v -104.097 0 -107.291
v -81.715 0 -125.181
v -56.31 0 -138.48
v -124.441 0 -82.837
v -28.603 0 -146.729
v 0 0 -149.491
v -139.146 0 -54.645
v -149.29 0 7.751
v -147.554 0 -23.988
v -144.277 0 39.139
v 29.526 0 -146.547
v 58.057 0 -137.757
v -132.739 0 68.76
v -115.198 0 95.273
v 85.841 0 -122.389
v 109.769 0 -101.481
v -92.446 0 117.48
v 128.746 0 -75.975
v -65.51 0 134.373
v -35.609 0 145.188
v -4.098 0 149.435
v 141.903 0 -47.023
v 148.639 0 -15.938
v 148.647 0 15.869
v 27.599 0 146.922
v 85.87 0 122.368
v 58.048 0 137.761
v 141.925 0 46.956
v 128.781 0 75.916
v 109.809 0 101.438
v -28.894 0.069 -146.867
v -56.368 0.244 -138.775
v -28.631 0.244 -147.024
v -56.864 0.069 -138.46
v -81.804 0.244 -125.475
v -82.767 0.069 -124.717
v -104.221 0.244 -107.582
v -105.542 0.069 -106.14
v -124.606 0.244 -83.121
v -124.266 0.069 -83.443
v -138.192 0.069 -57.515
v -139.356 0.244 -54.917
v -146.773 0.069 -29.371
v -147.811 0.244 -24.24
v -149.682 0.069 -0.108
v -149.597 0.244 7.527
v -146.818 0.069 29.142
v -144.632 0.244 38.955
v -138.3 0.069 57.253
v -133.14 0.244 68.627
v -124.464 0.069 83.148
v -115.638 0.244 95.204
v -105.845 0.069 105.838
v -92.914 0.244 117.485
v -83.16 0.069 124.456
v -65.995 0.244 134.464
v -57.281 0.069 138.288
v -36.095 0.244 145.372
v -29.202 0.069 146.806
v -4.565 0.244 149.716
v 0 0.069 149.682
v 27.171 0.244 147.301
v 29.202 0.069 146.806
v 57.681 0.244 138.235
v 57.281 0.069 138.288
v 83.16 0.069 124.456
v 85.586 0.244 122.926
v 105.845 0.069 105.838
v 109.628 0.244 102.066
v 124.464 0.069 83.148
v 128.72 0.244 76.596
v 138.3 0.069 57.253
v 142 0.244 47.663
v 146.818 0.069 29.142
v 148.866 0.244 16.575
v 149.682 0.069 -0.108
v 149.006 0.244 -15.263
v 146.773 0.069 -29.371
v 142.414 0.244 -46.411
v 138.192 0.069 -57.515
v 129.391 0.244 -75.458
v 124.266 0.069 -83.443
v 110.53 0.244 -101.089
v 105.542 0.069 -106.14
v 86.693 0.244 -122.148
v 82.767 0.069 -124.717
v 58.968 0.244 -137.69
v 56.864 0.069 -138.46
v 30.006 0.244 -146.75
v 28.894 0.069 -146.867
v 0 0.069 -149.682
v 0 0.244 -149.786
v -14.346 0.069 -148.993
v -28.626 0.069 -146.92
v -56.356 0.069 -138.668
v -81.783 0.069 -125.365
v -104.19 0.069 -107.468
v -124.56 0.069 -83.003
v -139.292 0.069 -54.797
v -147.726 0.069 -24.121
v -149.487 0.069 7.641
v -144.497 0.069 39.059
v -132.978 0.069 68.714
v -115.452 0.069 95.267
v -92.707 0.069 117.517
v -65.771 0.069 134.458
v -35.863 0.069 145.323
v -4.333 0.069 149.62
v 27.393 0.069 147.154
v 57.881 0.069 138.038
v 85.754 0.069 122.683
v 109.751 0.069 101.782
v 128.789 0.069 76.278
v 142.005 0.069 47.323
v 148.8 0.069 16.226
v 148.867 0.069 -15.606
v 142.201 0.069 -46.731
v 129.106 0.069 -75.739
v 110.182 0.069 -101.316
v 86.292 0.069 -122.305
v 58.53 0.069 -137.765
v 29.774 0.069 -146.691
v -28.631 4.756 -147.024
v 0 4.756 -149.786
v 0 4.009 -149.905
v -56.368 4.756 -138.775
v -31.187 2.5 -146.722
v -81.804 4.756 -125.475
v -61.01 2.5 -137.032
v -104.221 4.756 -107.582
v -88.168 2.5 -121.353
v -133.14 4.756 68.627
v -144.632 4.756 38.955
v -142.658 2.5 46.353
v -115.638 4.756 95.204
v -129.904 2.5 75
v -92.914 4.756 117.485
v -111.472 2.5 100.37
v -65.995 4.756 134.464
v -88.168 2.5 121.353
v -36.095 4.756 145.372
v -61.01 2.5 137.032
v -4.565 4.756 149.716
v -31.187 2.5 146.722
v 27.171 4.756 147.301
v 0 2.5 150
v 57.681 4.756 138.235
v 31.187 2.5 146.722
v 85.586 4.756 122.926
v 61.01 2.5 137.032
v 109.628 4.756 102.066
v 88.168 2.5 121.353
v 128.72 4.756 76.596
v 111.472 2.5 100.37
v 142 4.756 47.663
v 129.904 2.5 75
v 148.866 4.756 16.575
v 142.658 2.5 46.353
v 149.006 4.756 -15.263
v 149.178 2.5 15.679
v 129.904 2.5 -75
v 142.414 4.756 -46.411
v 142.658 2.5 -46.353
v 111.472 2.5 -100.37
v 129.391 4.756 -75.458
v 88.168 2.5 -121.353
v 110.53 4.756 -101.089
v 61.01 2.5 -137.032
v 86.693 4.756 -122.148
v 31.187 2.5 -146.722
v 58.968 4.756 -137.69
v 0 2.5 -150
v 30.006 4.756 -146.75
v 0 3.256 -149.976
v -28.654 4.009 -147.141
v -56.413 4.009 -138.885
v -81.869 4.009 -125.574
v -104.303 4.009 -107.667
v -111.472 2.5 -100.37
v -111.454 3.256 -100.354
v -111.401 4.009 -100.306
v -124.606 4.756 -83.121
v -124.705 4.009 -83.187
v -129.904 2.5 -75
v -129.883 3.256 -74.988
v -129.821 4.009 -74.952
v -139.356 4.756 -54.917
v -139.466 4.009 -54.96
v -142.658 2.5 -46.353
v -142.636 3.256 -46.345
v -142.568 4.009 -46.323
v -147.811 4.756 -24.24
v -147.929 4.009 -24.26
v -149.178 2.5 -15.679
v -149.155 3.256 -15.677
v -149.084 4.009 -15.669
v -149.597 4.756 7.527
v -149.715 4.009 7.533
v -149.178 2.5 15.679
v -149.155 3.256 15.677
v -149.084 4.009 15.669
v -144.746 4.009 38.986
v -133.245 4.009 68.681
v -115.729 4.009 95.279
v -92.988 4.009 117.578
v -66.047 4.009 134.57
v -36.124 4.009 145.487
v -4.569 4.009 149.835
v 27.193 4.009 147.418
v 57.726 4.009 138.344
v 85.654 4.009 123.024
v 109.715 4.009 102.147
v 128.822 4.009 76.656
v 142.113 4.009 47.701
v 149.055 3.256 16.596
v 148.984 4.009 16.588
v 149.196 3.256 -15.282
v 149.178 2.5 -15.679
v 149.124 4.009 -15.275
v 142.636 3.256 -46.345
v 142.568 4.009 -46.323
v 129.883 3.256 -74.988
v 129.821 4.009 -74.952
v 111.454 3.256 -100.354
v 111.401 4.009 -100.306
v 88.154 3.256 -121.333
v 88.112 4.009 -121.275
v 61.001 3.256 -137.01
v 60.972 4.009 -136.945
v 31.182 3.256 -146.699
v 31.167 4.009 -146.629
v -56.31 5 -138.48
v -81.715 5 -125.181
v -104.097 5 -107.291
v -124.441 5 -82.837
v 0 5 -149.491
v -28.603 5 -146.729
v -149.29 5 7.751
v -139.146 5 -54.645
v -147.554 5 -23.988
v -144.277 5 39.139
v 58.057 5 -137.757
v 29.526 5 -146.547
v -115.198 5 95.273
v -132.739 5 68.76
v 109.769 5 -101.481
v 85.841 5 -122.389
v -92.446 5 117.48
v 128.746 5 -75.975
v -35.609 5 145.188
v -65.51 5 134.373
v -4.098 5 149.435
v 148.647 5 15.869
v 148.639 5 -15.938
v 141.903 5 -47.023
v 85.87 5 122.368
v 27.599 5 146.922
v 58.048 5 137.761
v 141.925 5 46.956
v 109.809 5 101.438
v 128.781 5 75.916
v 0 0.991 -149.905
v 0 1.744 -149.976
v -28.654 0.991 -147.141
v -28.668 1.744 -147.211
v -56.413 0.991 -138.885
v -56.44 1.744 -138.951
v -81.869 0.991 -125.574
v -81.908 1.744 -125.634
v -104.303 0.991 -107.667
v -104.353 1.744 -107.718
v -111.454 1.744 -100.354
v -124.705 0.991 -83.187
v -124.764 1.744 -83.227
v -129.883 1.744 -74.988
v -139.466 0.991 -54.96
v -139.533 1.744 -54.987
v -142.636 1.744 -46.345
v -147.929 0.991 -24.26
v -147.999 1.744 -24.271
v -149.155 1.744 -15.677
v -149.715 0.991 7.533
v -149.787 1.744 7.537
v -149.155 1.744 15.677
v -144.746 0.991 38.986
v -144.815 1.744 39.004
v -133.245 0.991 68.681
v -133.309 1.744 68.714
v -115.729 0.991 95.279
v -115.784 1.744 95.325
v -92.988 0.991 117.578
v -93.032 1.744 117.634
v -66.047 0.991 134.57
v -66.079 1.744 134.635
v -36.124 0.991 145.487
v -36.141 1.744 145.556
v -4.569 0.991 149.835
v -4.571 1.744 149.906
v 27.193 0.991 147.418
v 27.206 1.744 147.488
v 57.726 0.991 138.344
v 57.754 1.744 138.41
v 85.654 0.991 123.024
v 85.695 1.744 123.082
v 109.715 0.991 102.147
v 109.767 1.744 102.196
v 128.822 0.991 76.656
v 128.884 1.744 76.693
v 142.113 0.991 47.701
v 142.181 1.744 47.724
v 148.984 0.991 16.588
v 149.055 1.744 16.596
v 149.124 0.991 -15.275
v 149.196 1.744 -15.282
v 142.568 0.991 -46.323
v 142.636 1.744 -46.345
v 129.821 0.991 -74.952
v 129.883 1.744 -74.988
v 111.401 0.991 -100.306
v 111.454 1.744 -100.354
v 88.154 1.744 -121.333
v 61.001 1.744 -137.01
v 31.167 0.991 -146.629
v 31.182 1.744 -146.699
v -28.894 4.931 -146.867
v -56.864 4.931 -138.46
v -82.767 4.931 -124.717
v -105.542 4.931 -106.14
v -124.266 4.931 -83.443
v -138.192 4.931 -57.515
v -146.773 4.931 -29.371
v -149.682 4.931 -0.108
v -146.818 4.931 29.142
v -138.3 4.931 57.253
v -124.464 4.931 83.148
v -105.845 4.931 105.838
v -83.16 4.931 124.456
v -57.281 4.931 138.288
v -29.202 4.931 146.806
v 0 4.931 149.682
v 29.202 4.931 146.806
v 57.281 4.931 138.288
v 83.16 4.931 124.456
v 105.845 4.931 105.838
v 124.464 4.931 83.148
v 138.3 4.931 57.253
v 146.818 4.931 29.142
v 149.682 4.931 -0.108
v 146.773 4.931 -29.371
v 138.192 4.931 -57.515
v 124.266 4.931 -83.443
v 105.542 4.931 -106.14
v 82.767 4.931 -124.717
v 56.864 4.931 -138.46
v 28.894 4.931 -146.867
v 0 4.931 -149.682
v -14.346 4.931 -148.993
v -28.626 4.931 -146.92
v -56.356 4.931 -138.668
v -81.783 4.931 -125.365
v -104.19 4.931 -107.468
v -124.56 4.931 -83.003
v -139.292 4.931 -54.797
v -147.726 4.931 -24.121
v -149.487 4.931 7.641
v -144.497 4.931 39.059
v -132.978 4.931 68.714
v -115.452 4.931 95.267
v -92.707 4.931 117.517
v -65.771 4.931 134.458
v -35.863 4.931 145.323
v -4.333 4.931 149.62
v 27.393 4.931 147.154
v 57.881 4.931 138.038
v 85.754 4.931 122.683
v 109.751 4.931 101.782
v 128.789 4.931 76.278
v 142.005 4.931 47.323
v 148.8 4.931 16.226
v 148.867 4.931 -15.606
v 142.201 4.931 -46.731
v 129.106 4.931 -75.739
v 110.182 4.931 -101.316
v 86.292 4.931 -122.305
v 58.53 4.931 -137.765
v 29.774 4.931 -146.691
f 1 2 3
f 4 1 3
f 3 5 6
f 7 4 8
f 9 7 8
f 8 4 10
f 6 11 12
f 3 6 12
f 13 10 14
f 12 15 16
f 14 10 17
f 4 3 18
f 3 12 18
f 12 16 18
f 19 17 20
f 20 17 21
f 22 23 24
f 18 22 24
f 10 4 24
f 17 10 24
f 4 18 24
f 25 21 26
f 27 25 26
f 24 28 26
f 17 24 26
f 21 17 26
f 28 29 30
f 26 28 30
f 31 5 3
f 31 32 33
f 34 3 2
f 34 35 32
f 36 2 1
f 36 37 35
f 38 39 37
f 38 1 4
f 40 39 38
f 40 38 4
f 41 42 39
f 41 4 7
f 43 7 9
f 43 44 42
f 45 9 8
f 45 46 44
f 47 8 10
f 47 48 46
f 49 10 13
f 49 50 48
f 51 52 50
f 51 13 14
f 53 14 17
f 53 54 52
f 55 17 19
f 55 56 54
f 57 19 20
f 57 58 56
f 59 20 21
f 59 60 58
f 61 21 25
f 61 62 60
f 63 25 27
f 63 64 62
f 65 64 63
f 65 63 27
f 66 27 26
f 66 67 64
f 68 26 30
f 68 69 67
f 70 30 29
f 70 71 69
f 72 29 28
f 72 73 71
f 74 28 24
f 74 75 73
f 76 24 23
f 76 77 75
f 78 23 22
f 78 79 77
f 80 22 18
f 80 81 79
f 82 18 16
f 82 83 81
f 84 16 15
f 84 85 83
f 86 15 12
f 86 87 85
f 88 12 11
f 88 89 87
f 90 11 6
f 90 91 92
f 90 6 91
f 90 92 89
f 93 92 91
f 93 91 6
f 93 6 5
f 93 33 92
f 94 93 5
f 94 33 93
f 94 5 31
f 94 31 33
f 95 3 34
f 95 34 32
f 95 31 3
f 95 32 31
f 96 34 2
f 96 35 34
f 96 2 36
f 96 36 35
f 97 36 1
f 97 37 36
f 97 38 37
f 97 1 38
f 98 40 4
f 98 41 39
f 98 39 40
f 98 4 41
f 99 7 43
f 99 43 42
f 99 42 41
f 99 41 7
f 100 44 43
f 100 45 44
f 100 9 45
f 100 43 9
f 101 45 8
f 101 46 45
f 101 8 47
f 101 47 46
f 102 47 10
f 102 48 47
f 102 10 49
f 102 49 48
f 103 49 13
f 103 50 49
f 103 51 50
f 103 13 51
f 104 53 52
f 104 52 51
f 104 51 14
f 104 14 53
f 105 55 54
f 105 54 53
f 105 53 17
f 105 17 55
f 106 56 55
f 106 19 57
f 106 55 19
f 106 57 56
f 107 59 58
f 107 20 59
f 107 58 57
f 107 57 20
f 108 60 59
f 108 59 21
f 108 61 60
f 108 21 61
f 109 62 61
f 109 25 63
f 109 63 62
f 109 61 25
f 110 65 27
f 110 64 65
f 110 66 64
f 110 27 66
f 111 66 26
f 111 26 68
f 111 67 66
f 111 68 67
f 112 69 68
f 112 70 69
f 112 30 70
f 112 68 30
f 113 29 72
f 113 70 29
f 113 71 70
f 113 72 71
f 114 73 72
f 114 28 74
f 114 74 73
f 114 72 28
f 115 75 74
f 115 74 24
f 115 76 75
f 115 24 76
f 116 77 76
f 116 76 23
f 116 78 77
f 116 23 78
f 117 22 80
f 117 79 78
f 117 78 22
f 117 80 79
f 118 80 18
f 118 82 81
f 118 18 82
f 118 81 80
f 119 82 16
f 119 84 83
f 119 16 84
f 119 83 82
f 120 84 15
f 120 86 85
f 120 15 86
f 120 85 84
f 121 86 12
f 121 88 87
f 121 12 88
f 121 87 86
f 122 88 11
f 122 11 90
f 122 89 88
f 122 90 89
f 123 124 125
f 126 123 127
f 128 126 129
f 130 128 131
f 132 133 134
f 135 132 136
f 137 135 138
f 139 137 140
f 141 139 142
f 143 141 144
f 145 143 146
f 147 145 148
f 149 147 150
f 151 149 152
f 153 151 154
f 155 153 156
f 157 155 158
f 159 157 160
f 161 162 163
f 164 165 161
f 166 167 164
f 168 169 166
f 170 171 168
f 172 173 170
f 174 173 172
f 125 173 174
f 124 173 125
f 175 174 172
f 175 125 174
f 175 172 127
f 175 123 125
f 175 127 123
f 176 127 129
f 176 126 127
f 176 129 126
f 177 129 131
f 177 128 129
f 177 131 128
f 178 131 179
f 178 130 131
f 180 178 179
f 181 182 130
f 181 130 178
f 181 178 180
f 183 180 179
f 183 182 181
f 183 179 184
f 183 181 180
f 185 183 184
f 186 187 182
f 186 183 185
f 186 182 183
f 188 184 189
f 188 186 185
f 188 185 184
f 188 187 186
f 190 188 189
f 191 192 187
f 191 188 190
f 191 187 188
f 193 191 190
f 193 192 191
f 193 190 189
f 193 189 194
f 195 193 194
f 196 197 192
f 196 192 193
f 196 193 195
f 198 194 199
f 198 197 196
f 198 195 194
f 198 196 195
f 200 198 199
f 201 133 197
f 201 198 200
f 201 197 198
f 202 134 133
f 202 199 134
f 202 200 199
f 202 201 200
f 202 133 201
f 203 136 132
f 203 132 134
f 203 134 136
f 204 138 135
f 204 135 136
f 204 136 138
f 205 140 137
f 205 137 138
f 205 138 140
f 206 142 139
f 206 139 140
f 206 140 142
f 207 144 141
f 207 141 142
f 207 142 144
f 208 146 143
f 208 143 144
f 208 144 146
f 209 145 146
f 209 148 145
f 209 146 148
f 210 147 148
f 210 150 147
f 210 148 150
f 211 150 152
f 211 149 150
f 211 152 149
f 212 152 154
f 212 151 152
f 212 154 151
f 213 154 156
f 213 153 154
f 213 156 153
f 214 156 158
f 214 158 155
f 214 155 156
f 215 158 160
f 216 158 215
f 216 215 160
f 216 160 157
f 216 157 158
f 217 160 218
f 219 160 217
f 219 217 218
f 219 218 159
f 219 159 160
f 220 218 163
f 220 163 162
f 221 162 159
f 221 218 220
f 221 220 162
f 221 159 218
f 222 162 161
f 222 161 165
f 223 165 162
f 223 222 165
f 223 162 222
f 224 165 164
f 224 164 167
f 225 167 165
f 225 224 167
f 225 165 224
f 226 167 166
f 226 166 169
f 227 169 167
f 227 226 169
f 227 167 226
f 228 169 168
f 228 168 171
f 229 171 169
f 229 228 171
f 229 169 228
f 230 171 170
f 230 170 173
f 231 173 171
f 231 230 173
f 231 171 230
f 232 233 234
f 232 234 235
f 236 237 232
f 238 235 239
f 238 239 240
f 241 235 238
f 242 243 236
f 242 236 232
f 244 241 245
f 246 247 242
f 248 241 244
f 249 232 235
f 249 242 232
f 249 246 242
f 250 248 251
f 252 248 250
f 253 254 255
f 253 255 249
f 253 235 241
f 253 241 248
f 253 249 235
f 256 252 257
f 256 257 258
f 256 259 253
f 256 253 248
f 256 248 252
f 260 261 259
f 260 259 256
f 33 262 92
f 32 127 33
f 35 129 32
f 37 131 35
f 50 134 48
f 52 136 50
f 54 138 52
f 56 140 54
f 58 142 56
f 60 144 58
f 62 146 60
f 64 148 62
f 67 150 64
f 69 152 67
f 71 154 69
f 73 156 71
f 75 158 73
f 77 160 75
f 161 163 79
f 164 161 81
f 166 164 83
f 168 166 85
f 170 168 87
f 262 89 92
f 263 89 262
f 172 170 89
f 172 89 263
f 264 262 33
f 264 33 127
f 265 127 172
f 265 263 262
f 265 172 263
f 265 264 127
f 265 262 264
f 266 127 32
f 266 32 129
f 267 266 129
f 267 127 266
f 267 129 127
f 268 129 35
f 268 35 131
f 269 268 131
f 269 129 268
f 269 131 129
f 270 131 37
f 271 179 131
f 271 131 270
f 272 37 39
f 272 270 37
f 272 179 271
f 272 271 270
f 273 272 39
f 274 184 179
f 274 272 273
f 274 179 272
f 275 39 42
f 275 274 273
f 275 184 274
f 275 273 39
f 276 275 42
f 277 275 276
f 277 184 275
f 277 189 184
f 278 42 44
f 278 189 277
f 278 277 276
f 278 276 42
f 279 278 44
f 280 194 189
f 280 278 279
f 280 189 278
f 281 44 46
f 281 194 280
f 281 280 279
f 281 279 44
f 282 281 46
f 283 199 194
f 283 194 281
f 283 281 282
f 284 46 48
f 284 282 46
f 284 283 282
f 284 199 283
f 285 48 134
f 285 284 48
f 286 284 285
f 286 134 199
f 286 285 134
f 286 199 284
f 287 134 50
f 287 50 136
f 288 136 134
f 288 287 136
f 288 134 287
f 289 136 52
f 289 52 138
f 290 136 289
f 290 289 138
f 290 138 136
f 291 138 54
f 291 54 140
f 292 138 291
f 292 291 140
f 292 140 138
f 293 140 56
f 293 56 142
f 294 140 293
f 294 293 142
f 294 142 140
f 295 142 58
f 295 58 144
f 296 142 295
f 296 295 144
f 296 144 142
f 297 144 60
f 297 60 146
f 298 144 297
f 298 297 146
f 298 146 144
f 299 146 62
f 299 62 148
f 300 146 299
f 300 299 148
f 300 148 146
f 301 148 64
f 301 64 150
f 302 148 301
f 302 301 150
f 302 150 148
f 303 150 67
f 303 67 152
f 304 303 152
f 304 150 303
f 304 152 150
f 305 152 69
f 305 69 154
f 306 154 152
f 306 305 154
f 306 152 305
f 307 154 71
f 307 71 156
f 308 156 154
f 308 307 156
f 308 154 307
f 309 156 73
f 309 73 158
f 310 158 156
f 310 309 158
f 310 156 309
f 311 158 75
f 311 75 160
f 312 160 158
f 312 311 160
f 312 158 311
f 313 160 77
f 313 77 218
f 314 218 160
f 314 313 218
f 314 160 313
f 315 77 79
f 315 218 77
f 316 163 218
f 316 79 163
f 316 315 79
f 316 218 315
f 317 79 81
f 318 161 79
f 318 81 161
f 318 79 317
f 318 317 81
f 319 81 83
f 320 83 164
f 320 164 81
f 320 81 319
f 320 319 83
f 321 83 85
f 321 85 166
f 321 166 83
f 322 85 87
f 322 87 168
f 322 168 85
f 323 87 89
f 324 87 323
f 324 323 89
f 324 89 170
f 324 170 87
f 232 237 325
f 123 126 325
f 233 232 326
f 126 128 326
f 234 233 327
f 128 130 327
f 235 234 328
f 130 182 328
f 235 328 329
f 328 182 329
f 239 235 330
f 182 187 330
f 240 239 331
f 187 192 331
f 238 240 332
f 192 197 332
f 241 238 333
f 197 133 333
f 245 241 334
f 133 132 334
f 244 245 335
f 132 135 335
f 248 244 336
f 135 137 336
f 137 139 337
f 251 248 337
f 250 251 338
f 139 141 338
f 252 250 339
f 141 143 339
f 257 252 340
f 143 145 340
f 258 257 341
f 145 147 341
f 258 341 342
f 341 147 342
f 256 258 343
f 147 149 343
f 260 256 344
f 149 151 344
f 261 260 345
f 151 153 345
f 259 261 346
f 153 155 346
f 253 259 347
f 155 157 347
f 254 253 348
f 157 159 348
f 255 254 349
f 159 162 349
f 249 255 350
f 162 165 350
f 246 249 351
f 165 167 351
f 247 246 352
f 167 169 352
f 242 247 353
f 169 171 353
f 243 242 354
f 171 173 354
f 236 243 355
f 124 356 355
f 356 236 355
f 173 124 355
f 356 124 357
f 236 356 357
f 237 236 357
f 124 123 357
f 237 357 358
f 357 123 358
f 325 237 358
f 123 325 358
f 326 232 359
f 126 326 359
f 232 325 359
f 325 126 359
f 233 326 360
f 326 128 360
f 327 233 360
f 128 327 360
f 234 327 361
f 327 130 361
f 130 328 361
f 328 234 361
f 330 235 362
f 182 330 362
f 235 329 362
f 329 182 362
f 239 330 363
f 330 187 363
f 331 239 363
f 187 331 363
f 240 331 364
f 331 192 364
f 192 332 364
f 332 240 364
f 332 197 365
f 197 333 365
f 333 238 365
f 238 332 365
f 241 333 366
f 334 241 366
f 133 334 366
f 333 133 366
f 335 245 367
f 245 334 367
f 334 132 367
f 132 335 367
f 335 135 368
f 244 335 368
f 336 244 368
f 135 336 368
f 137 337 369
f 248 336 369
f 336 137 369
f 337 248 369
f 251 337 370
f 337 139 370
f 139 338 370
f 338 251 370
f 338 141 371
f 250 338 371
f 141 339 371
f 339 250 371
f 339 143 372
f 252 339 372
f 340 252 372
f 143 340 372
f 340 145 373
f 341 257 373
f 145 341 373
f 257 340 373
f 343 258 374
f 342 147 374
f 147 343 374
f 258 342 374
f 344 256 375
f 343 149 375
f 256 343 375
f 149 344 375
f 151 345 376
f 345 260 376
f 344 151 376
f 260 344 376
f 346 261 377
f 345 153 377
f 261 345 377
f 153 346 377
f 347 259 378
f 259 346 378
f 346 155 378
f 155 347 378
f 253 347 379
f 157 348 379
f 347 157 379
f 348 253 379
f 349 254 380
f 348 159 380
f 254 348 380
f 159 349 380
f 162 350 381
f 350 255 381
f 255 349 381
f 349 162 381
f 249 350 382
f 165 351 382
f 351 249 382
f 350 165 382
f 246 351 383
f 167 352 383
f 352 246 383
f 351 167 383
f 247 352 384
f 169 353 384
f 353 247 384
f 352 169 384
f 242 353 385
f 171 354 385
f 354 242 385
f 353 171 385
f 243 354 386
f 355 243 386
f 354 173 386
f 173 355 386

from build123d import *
from build123d.topology import SkipClean

# Parameters (mm, degrees)
SKETCH1_R           = 150
BOSS_EXTRUDE1_DEPTH = 5
FILLET1_R           = 0.3


with BuildPart() as part:
    # Sketch1 → Boss-Extrude1 (new body)
    with BuildSketch(Plane(origin=(0, 0, 0), x_dir=(1, 0, 0), z_dir=(0, 1, 0))):
        Circle(SKETCH1_R)
    extrude(amount=BOSS_EXTRUDE1_DEPTH)

    # Sketch2 → Cut-Revolve2 (revolve, cut)
    with SkipClean():  # the faces are left unmerged after this step: merging them gives an invalid solid
        with BuildSketch(Plane.XY):
            with BuildLine():
                Line((-150, 5), (-152.218260016, 5))
                Line((-152.218260016, 5), (-152.218260016, 0))
                Line((-152.218260016, 0), (-150, 0))
                Line((-150, 0), (-149.736694594, 0))
                ThreePointArc((-149.736694594, 0), (-150, 2.5), (-149.736694594, 5))
                Line((-149.736694594, 5), (-150, 5))
            make_face()
        revolve(axis=Axis((0, 0, 0), (0, 1, 0)), mode=Mode.SUBTRACT)
    add(part.part.scale(1), mode=Mode.REPLACE)  # the faces are merged on a copy

    # Fillet1
    fillet1_edges = [part.edges().sort_by_distance(p)[0] for p in [
        (149.736694594, 0, 0),
        (149.736694594, 5, 0),
    ]]
    fillet(fillet1_edges, radius=FILLET1_R)


solid = part.part
